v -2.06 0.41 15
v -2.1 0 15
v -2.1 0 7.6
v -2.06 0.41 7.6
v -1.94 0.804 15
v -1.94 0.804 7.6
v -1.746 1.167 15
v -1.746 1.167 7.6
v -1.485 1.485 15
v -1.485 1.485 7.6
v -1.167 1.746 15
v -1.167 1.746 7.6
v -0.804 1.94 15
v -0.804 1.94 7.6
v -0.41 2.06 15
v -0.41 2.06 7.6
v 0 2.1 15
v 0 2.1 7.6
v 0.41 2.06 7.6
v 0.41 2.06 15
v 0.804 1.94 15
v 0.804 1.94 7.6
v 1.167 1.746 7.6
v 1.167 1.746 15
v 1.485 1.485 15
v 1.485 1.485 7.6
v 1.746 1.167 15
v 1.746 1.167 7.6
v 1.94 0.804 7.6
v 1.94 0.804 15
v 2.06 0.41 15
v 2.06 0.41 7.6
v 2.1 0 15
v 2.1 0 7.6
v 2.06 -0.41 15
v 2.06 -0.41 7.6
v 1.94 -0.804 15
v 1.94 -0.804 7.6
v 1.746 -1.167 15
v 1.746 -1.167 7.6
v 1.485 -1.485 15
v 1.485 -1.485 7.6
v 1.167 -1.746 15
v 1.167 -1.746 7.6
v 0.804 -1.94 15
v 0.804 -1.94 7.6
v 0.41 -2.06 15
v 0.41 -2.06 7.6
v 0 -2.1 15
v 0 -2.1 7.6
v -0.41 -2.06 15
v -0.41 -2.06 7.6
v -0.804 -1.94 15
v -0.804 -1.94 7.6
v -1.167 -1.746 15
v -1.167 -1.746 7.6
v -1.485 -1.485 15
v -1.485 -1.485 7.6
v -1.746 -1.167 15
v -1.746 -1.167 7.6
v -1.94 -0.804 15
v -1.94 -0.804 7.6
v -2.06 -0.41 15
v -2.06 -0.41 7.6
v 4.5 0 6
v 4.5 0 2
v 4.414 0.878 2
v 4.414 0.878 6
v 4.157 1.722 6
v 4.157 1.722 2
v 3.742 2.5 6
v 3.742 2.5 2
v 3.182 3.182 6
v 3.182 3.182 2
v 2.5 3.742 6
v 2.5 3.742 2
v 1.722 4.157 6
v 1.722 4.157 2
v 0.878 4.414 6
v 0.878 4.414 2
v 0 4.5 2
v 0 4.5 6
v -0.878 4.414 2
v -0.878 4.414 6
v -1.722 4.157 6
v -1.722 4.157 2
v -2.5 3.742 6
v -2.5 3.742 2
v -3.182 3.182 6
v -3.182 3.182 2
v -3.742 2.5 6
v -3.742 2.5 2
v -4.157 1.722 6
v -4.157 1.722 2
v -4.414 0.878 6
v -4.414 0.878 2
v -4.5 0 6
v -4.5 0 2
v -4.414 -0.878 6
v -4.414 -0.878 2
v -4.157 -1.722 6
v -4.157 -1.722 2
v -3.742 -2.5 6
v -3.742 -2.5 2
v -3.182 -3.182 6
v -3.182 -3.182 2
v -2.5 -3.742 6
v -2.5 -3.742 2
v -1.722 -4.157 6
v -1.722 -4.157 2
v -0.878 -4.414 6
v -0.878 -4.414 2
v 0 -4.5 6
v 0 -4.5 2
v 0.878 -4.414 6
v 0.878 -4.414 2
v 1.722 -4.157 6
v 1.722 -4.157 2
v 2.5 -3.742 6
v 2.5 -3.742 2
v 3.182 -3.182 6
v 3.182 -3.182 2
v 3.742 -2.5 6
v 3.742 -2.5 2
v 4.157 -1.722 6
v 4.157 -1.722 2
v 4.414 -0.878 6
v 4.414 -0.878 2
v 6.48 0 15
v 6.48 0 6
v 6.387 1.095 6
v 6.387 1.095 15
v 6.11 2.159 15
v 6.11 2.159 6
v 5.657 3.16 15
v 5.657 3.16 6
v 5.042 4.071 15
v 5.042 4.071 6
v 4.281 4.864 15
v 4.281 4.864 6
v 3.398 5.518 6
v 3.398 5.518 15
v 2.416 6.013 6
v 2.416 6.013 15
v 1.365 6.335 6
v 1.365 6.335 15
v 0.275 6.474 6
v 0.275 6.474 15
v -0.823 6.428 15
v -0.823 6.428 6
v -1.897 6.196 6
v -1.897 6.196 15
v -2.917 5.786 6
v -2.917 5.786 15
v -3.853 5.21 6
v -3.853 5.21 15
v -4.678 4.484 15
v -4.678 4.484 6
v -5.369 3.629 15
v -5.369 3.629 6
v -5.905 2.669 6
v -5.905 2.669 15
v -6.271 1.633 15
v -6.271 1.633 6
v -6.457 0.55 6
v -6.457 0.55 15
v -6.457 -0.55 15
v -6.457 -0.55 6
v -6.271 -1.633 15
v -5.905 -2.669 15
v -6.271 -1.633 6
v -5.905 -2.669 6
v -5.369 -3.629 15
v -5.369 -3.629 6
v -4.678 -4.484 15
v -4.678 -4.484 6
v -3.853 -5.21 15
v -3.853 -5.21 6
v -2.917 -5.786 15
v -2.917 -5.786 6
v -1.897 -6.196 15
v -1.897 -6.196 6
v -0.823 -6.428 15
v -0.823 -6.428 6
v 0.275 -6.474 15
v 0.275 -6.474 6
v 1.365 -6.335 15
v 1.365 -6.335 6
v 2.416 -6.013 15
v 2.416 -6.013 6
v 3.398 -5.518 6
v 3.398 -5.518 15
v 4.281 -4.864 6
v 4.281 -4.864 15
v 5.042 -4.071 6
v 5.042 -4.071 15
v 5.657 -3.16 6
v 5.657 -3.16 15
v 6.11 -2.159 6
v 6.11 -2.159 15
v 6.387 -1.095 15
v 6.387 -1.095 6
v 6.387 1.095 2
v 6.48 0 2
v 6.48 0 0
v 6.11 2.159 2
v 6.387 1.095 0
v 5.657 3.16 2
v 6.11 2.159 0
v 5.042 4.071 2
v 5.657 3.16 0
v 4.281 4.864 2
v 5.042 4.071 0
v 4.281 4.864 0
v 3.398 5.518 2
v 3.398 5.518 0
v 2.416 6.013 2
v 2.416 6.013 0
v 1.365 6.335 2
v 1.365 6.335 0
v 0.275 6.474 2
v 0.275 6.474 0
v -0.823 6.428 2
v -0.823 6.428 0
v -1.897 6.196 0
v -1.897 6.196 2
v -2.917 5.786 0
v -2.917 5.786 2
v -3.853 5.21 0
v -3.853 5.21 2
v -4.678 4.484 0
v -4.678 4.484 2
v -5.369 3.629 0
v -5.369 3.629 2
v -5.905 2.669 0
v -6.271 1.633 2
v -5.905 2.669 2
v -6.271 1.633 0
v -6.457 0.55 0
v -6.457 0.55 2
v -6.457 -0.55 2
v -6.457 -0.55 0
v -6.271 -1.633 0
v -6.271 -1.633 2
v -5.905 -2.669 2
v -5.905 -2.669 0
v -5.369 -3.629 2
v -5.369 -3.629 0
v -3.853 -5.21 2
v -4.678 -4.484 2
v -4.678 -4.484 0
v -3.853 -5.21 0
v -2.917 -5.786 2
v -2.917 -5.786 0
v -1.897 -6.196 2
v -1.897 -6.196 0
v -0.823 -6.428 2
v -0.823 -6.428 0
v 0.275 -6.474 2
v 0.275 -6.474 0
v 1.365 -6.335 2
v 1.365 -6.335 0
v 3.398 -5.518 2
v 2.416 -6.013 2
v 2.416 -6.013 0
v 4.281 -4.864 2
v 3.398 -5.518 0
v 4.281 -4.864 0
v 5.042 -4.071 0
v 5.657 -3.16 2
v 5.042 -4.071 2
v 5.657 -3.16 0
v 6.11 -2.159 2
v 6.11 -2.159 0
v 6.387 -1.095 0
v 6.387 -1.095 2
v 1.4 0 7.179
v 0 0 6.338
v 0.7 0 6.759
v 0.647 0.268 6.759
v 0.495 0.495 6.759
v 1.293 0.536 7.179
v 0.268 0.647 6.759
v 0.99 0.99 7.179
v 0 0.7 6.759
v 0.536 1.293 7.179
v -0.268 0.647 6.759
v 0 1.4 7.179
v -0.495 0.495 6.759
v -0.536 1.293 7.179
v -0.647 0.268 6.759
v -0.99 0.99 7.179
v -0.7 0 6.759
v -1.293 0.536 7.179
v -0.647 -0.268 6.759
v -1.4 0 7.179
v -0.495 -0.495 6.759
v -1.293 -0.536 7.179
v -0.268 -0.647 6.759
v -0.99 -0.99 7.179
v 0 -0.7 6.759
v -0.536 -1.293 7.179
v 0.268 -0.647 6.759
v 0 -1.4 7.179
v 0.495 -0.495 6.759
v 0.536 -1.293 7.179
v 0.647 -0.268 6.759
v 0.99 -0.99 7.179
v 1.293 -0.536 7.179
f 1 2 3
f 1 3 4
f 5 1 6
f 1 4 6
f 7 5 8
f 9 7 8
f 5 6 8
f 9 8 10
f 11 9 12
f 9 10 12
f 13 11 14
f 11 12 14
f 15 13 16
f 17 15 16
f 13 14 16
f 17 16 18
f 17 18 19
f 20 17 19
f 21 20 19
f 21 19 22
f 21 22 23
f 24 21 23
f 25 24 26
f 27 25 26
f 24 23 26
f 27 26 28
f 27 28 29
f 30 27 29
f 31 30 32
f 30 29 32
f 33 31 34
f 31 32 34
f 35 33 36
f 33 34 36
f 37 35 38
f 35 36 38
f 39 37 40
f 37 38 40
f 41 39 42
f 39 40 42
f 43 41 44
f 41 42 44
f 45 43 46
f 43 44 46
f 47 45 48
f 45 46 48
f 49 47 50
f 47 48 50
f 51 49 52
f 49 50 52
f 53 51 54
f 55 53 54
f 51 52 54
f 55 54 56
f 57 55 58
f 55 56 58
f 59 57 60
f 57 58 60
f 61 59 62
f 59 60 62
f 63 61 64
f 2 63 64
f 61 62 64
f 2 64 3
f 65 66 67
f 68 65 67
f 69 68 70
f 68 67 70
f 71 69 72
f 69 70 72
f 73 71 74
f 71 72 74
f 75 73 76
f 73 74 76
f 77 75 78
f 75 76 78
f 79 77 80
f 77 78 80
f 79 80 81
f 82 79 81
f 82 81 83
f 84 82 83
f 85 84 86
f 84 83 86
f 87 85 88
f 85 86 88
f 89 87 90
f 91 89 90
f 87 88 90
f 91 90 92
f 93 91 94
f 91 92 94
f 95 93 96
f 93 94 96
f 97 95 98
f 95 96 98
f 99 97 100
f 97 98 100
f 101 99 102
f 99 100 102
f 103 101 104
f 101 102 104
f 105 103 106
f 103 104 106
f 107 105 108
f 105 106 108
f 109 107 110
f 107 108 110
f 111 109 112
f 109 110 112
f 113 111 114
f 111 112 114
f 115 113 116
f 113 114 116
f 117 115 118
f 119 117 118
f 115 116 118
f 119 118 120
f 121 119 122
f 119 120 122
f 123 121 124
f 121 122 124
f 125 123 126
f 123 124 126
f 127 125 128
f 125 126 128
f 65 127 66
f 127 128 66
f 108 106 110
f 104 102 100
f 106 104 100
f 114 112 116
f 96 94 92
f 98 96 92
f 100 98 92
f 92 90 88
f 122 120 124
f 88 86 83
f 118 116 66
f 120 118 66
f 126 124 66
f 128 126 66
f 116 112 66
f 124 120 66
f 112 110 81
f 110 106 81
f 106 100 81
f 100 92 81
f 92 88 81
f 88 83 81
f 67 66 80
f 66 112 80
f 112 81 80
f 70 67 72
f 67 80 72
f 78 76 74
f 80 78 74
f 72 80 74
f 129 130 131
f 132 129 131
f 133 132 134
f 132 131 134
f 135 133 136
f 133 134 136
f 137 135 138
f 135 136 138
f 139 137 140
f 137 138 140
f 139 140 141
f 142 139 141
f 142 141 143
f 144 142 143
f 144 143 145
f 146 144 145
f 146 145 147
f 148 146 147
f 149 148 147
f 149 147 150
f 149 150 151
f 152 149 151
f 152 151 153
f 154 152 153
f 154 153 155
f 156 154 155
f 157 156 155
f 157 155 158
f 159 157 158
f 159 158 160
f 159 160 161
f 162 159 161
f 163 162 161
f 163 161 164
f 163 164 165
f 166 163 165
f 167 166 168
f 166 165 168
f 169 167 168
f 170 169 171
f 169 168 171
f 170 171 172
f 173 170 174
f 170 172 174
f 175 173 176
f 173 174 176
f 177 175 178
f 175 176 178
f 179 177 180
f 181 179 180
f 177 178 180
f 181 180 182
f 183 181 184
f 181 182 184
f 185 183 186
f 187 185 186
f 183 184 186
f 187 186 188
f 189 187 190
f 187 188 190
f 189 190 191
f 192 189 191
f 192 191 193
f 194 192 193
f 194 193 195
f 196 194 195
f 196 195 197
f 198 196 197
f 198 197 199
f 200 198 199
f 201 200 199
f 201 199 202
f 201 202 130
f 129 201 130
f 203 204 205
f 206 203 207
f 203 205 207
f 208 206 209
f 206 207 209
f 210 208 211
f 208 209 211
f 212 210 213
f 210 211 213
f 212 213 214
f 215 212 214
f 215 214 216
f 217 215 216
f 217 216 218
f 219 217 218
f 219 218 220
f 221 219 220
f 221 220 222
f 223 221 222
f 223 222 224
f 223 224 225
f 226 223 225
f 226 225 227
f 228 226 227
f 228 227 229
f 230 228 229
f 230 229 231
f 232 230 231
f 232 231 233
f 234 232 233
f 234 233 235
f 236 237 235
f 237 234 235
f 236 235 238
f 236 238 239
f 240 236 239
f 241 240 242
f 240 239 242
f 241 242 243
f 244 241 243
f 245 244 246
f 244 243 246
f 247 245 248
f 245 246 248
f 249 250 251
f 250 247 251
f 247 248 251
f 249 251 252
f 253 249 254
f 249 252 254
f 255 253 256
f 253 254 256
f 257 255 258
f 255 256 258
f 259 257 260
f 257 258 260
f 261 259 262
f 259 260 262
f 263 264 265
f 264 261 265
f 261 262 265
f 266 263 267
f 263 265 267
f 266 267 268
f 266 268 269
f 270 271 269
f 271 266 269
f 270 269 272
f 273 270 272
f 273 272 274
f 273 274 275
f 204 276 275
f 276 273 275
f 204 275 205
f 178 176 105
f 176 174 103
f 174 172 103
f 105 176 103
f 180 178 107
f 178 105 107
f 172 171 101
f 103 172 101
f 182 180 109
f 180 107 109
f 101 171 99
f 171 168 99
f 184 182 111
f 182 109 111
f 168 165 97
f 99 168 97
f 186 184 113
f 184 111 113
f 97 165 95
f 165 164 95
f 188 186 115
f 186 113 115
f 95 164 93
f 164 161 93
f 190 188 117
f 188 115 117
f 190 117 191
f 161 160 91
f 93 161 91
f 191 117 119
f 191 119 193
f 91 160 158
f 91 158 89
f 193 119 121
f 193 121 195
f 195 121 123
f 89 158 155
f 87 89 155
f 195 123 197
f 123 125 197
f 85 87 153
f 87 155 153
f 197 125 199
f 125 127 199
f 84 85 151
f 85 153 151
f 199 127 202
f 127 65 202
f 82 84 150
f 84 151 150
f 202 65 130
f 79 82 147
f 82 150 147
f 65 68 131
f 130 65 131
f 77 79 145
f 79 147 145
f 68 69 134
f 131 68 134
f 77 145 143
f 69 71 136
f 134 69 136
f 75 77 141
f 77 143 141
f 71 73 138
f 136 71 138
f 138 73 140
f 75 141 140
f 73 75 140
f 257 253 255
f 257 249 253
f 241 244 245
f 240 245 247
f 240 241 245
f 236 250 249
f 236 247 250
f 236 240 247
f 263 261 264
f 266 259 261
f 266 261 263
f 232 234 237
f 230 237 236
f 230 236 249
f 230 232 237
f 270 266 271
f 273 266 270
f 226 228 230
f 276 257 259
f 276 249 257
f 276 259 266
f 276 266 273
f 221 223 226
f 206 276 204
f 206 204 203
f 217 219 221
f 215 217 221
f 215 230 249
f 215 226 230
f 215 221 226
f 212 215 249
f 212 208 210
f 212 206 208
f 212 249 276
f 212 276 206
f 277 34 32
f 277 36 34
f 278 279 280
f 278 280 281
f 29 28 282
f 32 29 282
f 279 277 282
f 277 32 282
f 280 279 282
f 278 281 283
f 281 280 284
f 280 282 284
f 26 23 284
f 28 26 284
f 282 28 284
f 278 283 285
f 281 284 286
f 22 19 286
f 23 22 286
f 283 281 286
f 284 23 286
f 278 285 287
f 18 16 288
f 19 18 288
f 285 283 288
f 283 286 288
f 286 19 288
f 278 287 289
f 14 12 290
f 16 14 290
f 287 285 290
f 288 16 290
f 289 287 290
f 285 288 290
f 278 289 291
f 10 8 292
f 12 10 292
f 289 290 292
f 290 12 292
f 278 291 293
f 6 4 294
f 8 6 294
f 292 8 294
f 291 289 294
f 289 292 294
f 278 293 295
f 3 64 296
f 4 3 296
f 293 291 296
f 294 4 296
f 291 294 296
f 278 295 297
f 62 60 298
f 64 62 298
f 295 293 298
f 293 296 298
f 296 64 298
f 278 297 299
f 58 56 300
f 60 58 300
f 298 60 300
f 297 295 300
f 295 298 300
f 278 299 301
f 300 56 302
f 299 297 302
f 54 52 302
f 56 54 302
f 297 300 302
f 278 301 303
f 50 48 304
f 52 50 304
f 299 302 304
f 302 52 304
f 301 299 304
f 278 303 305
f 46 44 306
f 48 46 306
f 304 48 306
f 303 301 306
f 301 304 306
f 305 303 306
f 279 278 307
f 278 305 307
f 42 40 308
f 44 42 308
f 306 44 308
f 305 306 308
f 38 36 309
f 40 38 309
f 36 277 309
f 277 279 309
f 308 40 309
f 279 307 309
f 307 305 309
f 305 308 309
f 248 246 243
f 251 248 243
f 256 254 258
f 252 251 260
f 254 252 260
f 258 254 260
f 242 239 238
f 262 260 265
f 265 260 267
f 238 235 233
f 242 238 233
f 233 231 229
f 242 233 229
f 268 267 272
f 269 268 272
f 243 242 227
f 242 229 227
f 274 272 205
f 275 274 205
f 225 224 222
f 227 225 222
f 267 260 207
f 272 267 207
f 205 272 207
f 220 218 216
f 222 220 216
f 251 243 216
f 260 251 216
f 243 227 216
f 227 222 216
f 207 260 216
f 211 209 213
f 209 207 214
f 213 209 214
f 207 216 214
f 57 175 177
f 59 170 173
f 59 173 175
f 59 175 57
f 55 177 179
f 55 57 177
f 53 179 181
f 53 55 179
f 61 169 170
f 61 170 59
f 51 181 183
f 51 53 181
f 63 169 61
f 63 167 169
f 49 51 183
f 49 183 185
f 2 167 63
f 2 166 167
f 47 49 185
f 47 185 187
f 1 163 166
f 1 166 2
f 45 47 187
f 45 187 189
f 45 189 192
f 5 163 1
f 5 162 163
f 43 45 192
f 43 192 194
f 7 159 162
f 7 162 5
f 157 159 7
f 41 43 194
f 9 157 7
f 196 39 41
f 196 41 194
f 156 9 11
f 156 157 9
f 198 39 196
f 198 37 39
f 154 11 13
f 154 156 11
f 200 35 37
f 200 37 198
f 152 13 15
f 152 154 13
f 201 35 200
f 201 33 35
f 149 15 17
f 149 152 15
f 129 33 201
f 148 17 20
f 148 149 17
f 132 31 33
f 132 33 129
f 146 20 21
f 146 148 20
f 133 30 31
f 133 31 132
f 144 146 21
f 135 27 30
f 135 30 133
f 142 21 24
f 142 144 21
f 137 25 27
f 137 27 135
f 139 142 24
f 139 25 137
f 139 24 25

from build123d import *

# Parameters (mm, degrees)
SKETCH1_R               = 6.48
BOSS_EXTRUDE1_DEPTH     = 15
CUT_EXTRUDE3_DEPTH      = 2
CUT_EXTRUDE3_DEPTH_BACK = 2
CUT_EXTRUDE3_START      = -11
SKETCH8_OUTSIDE_W       = 19.696
SKETCH8_OUTSIDE_H       = 19.696
SKETCH8_OUTSIDE_R       = 4.5
M5_TAPPED_HOLE1_D       = 4.2
M5_TAPPED_HOLE1_DEPTH   = 7.4
M5_TAPPED_HOLE1_TIP     = 1.2618073


# Read off the part's stored shape, not the designer's step: Split2
with BuildPart() as part:
    # Sketch1 → Boss-Extrude1 (new body)
    with BuildSketch(Plane.XY):
        Circle(SKETCH1_R)
    extrude(amount=BOSS_EXTRUDE1_DEPTH)

    # Sketch8 outside → Cut-Extrude3 (cut, two sides: drawn at the far end of the back side and taken through both)
    with BuildSketch(Plane.XY.offset(15).offset(CUT_EXTRUDE3_START - CUT_EXTRUDE3_DEPTH_BACK)):
        Rectangle(SKETCH8_OUTSIDE_W, SKETCH8_OUTSIDE_H)
        Circle(SKETCH8_OUTSIDE_R, mode=Mode.SUBTRACT)
    extrude(amount=CUT_EXTRUDE3_DEPTH + CUT_EXTRUDE3_DEPTH_BACK, mode=Mode.SUBTRACT)

    # M5 Tapped Hole1
    with Locations(Plane.XY.offset(15)):
        with Locations((0, 0)):
            Hole(M5_TAPPED_HOLE1_D / 2, depth=M5_TAPPED_HOLE1_DEPTH)
            with Locations((0, 0, -(M5_TAPPED_HOLE1_DEPTH + M5_TAPPED_HOLE1_TIP / 2))):  # 118° drill point
                Cone(0, M5_TAPPED_HOLE1_D / 2, M5_TAPPED_HOLE1_TIP, mode=Mode.SUBTRACT)


with BuildPart() as body_2:
    # Split2: the piece on the far side of the plane
    add(part.part)
    split(bisect_by=Plane.XY.offset(2), keep=Keep.BOTTOM)


with BuildPart() as part_1:
    add(part.part)

    # Split2
    split(bisect_by=Plane.XY.offset(2), keep=Keep.TOP)


solid = Compound([body_2.part, part_1.part])
